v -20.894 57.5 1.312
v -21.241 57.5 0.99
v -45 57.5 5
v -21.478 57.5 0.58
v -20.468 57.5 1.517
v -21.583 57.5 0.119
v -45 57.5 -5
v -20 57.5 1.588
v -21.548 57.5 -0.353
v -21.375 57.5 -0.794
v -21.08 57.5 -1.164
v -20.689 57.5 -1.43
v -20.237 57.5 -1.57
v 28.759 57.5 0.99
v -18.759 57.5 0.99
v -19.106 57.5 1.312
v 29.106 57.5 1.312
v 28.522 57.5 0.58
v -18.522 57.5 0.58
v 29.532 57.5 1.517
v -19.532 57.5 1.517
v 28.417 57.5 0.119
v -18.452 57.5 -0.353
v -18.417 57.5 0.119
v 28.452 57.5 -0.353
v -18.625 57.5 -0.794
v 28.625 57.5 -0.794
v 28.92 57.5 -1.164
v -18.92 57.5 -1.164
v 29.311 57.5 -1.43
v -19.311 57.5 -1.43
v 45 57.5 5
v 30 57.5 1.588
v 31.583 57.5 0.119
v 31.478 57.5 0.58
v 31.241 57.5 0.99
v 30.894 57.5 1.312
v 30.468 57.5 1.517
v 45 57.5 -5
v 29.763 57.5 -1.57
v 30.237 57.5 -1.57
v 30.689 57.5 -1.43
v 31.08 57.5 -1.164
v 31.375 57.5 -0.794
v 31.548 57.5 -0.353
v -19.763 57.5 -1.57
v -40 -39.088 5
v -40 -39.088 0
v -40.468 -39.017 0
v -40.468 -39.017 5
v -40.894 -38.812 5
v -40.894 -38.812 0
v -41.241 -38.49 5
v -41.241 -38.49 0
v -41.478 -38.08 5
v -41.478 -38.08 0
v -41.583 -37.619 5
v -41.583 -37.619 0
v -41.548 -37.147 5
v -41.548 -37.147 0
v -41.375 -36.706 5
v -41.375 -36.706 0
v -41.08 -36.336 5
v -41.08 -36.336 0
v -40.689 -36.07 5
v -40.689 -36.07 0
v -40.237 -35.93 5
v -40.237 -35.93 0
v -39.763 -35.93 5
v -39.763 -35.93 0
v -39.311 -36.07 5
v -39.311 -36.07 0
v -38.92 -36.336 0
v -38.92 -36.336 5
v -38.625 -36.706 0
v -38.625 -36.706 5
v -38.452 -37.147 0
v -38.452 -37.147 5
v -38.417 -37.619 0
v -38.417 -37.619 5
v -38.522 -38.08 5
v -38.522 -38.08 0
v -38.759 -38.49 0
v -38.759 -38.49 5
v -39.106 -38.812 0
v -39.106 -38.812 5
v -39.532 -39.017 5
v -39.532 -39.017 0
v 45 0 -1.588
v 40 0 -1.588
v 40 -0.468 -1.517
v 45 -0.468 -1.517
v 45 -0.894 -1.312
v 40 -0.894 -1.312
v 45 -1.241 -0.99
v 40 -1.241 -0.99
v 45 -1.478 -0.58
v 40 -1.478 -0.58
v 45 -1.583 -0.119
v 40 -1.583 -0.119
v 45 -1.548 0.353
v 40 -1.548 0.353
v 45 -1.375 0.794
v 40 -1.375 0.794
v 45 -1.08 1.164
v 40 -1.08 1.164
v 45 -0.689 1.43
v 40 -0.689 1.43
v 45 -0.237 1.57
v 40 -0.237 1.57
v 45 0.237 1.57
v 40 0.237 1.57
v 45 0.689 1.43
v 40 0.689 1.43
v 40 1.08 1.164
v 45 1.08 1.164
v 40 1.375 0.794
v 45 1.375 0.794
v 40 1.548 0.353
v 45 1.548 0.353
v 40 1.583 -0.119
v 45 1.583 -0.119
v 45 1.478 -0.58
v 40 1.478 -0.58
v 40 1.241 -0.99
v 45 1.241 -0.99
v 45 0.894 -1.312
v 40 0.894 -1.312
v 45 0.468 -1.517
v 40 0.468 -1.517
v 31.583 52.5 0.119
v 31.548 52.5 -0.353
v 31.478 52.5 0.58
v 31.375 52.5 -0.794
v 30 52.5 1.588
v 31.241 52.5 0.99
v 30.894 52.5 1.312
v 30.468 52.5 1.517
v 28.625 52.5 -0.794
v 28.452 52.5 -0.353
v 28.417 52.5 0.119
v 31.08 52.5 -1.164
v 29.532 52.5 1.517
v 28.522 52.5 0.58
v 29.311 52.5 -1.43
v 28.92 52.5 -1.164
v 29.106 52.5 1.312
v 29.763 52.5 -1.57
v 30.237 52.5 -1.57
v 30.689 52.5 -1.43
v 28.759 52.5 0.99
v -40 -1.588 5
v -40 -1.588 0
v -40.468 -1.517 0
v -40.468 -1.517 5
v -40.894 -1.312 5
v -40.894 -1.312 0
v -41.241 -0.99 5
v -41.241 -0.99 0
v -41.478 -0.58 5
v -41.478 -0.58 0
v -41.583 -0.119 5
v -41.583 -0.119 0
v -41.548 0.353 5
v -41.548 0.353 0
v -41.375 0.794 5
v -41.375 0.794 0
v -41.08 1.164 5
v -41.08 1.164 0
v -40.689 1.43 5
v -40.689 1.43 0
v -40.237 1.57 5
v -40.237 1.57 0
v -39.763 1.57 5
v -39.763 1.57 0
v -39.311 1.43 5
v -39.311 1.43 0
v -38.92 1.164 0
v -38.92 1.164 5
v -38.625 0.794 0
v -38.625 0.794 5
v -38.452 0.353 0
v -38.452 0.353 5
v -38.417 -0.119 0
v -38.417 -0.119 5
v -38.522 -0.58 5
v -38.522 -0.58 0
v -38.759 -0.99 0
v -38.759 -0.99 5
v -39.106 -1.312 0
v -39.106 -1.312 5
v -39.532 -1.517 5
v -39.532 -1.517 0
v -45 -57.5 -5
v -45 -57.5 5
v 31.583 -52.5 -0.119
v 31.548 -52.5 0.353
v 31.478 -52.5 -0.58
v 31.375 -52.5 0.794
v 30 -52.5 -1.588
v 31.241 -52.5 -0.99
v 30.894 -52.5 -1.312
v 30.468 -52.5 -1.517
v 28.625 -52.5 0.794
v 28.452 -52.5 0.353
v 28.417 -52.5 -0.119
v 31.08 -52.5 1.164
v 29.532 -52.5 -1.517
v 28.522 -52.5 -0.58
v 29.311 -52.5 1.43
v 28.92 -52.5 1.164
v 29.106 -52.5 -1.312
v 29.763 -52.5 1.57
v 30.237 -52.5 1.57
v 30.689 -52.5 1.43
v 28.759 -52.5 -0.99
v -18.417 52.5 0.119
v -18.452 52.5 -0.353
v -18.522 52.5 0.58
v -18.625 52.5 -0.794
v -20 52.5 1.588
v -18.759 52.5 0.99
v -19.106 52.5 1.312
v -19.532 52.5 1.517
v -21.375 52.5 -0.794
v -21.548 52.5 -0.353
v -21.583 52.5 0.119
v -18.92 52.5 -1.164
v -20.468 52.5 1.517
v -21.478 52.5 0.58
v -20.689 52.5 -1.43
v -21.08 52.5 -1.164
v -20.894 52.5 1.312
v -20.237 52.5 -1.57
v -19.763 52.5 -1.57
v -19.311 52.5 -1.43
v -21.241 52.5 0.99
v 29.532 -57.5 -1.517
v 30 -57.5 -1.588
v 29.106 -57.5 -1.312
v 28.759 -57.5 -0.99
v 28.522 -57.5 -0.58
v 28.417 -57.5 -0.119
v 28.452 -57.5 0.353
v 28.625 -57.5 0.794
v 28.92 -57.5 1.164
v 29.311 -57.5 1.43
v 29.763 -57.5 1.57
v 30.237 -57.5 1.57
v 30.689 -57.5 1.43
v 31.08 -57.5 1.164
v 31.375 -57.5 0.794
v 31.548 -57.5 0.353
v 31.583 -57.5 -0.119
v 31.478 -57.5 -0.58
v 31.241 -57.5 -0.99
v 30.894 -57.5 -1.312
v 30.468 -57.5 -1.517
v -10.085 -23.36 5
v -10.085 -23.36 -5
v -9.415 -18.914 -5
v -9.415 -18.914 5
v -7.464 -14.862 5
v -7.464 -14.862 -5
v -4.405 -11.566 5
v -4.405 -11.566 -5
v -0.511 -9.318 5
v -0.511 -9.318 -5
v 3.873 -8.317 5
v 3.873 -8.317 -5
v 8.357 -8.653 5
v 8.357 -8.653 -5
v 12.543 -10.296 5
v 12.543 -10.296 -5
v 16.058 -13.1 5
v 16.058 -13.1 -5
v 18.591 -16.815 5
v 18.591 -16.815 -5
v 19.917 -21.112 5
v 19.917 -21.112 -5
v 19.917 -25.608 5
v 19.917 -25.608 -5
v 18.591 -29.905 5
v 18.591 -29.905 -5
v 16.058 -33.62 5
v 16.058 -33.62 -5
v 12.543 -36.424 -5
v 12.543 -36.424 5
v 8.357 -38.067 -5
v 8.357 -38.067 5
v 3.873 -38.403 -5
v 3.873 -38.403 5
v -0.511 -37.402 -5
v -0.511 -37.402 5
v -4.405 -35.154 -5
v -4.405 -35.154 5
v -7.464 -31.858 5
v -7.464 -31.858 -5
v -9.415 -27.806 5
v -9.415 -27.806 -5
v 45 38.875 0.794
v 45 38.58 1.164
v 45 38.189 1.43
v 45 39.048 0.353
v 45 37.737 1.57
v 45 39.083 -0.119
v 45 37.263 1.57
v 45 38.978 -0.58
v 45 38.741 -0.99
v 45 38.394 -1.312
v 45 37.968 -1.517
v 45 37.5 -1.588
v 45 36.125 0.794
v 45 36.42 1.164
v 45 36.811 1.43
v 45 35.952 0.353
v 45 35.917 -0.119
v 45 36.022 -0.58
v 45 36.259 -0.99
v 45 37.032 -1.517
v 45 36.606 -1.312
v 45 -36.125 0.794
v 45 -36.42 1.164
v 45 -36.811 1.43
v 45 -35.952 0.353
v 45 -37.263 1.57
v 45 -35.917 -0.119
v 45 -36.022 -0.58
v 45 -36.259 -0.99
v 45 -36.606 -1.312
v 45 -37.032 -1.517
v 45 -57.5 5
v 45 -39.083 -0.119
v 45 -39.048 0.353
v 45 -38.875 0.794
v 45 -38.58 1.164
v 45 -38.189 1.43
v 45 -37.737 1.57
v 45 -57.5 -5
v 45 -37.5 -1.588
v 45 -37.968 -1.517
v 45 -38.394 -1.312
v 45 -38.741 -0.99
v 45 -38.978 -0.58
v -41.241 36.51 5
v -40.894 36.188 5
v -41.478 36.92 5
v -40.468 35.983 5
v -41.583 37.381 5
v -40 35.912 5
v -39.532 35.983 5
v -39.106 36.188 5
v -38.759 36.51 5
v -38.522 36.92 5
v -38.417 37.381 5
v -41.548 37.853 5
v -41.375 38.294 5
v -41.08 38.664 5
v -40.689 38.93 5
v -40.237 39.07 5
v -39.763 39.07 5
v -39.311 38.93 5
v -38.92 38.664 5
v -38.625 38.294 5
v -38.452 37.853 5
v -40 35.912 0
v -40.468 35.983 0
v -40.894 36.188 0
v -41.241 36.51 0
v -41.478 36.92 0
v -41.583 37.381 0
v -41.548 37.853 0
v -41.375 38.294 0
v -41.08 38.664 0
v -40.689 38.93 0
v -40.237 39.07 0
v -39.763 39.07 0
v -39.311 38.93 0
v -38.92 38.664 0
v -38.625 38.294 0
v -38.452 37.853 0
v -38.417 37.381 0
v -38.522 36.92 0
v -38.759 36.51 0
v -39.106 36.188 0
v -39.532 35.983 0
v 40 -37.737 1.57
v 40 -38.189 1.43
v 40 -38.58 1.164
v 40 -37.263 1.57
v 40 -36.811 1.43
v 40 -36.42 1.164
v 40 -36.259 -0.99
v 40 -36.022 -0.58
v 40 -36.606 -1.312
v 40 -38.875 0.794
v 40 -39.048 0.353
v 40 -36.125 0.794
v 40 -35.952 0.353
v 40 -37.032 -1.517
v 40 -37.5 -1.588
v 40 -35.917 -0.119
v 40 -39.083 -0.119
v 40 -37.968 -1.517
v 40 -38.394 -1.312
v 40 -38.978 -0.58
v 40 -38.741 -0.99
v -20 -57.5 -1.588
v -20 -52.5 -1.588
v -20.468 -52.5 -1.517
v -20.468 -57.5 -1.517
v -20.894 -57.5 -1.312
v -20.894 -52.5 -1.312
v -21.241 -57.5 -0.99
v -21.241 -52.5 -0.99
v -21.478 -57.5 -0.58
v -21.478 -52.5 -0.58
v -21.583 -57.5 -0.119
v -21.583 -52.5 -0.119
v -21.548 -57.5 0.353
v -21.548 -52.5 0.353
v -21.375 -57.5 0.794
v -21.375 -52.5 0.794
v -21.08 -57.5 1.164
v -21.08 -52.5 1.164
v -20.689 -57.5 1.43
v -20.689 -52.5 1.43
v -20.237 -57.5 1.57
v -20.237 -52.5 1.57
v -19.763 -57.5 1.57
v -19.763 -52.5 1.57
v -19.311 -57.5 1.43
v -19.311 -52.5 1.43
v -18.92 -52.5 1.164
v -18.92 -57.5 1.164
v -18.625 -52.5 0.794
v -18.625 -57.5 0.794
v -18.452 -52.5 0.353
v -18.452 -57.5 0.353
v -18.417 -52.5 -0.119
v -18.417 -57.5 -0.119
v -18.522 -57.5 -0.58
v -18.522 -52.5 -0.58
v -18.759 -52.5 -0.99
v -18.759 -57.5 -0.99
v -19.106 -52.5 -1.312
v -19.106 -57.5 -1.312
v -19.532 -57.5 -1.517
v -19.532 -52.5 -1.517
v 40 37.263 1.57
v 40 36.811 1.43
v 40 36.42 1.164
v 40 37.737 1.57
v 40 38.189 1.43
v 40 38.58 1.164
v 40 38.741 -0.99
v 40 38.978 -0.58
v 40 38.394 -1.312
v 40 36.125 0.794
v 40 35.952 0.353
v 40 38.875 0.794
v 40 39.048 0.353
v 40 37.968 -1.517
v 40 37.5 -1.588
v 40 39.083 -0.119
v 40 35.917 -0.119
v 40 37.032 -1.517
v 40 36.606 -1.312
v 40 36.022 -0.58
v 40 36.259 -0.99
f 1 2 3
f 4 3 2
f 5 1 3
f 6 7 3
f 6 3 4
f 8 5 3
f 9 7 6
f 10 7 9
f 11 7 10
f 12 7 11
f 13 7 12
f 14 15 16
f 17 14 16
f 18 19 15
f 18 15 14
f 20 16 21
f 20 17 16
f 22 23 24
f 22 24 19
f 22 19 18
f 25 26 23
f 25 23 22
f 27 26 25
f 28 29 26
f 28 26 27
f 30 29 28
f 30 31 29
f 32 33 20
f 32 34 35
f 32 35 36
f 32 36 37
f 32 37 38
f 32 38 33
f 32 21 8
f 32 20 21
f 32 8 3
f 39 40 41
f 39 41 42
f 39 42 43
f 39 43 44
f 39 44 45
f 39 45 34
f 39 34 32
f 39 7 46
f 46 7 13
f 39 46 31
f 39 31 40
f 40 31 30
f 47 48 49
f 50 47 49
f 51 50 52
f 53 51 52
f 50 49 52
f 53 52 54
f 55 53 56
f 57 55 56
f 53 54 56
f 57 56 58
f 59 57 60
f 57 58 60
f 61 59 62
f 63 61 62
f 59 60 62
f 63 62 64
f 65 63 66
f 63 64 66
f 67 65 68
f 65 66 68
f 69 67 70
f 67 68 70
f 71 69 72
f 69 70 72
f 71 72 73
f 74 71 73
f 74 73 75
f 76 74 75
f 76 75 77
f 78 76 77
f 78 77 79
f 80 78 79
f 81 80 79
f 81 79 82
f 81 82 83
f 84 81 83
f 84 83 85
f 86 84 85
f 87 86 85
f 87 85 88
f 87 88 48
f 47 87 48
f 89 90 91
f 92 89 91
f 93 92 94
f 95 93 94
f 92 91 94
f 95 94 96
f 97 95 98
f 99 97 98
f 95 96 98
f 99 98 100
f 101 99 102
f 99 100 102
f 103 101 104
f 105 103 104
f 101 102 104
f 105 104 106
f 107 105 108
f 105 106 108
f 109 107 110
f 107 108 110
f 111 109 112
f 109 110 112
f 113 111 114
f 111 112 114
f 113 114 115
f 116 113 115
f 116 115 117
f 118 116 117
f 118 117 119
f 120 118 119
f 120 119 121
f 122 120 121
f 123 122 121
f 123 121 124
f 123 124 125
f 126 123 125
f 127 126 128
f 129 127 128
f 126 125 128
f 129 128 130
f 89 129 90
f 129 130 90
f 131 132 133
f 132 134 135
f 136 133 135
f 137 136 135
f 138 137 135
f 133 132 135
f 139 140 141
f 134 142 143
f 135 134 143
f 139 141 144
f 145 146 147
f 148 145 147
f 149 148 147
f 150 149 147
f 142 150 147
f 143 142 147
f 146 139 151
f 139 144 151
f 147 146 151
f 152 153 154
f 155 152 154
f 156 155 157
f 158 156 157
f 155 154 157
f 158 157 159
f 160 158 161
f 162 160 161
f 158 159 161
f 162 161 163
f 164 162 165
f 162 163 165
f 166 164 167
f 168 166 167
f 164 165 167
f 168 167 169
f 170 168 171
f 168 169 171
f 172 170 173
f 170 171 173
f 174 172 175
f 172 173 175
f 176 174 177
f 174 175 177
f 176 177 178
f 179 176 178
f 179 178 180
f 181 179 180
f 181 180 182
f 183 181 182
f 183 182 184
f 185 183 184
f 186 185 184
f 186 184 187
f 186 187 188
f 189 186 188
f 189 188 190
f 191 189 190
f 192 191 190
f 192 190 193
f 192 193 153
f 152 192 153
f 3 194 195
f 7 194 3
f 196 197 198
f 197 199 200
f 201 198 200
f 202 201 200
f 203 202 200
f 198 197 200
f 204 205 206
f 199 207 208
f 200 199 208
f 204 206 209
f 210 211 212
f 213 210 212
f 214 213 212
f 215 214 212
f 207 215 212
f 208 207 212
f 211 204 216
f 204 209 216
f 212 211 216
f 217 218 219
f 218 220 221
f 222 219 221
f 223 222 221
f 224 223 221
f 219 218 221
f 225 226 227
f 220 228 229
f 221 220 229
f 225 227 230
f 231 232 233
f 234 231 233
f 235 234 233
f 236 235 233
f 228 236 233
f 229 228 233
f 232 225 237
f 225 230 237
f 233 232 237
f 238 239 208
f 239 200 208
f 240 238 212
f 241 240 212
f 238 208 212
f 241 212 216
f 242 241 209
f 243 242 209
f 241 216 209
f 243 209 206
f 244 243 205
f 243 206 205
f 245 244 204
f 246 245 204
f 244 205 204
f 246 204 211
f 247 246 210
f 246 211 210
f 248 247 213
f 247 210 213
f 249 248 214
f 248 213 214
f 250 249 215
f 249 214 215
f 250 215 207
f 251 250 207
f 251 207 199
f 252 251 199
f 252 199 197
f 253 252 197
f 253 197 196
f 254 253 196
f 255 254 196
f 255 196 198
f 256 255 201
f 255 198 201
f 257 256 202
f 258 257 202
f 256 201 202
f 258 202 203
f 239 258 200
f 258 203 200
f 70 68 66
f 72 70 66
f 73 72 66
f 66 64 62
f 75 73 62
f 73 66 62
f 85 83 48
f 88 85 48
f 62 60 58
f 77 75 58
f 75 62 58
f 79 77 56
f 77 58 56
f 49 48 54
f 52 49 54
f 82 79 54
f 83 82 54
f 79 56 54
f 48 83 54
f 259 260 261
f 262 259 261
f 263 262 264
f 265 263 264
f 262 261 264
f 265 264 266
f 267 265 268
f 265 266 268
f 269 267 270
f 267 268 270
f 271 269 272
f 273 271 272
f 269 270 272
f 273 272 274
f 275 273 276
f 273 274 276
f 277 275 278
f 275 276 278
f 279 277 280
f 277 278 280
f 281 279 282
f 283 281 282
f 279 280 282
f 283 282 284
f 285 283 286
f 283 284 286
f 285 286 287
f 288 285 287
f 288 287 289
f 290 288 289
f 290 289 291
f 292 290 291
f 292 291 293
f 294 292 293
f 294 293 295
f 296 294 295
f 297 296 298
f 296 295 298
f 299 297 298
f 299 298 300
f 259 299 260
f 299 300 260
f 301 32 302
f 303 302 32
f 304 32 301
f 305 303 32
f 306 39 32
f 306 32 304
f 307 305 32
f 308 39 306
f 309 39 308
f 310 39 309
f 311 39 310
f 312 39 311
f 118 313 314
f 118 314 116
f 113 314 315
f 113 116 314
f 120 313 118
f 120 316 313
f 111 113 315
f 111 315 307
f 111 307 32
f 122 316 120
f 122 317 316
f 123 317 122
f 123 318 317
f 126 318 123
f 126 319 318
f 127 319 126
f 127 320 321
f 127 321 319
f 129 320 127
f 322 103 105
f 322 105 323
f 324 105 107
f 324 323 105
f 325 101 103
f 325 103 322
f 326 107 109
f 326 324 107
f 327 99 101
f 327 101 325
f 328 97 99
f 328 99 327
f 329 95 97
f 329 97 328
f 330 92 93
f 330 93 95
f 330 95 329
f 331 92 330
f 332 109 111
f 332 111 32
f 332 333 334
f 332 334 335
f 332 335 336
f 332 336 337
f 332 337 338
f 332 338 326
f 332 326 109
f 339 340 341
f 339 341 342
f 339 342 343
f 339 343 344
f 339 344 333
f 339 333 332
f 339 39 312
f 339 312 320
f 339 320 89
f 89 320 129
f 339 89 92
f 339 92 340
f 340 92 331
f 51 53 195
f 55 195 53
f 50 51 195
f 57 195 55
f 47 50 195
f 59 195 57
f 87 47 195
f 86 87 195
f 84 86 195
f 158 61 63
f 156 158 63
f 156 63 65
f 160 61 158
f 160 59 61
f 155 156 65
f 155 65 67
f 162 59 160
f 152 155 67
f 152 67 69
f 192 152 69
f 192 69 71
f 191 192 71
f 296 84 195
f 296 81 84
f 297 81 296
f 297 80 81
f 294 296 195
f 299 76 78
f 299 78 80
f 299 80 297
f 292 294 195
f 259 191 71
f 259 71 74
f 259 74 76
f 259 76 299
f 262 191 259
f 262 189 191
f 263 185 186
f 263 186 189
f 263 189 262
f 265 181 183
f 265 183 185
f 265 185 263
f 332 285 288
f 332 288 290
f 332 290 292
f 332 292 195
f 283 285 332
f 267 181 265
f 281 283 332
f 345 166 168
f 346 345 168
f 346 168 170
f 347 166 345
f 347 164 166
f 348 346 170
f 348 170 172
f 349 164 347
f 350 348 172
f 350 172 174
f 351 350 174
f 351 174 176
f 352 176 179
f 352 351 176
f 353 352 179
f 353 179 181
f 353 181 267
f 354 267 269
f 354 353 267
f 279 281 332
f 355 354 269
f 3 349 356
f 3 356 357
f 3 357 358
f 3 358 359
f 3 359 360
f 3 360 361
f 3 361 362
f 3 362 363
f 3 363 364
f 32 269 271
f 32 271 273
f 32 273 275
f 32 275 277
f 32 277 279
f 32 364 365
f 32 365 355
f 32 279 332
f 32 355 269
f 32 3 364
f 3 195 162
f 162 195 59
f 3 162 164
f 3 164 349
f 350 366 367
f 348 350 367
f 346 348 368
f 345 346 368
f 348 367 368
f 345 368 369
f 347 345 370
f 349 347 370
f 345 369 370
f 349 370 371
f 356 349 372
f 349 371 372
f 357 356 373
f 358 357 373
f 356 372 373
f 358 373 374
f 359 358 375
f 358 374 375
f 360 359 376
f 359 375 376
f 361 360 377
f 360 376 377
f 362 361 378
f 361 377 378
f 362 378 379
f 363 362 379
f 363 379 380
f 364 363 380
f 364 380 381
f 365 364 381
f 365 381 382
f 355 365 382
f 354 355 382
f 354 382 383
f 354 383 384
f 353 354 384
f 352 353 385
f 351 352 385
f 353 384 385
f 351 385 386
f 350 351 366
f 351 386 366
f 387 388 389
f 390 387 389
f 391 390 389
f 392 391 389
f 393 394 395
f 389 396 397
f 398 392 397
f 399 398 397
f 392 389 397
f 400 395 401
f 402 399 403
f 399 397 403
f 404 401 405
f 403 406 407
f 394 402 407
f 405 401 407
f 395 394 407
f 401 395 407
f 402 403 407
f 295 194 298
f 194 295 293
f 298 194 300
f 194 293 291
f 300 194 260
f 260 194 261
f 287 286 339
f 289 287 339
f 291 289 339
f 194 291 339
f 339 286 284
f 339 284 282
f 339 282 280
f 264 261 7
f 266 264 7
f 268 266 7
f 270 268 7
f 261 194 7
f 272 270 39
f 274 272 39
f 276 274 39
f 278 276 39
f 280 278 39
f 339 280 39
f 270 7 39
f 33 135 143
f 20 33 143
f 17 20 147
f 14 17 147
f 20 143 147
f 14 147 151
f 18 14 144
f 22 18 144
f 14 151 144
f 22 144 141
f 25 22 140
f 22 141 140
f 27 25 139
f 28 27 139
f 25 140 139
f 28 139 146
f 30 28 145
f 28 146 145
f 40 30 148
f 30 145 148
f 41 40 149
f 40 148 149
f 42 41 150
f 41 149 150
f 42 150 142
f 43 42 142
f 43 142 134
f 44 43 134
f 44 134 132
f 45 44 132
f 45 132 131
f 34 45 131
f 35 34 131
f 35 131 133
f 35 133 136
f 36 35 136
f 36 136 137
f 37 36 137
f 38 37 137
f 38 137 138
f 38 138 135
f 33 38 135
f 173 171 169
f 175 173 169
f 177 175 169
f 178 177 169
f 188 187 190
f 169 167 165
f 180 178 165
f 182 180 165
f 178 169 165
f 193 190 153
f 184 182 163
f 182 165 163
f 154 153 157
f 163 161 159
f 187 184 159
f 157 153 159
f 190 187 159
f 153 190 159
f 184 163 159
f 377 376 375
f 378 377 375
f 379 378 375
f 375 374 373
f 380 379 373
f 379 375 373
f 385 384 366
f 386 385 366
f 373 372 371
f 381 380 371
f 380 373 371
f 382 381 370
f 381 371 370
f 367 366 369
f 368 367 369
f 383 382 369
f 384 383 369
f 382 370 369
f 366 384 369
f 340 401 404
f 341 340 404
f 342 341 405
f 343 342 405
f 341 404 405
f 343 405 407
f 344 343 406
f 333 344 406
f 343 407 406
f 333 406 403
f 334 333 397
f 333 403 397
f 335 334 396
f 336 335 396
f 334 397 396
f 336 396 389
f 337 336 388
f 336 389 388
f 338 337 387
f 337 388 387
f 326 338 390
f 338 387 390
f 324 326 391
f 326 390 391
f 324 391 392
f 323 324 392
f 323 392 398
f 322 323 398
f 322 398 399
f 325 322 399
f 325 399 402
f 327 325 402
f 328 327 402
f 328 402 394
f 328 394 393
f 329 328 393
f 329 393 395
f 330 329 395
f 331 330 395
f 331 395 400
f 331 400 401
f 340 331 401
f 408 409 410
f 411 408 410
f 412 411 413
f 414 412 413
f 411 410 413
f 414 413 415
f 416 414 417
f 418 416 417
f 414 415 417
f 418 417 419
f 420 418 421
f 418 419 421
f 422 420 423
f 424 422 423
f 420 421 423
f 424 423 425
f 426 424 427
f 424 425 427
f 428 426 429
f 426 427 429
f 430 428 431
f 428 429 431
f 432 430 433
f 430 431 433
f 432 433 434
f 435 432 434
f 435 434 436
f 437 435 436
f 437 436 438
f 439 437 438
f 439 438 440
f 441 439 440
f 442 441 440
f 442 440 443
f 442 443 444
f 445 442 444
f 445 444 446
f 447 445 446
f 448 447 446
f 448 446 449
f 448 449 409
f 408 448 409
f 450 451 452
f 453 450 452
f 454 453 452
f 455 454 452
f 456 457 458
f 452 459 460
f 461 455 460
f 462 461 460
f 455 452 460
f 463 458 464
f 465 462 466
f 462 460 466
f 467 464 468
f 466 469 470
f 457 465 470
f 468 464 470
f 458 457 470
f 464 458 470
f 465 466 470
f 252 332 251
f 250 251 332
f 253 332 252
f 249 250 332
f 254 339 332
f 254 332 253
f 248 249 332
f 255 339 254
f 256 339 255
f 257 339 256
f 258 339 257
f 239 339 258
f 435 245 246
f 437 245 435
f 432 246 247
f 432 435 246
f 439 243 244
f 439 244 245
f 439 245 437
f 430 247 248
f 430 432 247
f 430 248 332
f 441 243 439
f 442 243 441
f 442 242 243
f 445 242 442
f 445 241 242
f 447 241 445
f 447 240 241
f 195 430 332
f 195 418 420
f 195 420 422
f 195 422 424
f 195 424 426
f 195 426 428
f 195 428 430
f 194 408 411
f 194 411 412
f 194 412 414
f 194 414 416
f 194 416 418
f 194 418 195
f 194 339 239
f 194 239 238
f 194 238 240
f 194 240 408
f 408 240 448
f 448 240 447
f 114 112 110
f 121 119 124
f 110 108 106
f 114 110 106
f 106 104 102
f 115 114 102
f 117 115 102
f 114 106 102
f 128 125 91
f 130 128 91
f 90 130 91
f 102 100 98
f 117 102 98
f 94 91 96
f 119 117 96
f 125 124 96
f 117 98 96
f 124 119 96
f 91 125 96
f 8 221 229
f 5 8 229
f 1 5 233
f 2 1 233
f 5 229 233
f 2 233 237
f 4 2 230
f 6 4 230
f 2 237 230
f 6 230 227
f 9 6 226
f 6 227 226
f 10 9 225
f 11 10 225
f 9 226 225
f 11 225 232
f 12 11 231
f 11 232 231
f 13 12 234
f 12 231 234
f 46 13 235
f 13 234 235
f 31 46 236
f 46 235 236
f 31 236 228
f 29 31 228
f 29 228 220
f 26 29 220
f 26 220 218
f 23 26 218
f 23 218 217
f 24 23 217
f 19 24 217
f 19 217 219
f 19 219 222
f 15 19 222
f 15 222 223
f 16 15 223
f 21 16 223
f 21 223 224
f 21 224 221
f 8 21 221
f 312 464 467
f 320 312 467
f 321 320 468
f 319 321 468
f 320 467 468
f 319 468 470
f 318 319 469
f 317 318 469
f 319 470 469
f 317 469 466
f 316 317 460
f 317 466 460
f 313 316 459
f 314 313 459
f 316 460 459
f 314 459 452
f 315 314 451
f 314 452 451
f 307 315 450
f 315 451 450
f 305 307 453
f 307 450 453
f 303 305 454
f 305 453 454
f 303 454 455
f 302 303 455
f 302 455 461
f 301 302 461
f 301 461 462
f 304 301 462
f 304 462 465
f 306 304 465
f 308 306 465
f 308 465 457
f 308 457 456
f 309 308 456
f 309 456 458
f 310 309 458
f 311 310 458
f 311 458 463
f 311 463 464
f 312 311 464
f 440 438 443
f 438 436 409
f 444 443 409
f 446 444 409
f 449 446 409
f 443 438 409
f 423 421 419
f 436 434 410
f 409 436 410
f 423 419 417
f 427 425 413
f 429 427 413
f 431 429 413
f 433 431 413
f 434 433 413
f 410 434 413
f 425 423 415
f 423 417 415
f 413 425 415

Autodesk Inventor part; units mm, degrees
ref_plane "YZ Plane" through (0, 0, 0) normal (1, 0, 0) x (0, 1, 0)
ref_plane "XZ Plane" through (0, 0, 0) normal (0, 1, 0) x (-1, 0, 0)
ref_plane "XY Plane" through (0, 0, 0) normal (0, 0, 1) x (1, 0, 0)
sketch "Sketch1" plane through (0, 0, 0) normal (0, 0, 1) x (1, 0, 0)
  line L0 (-45, 57.5) -> (45, 57.5)
  line L1 (45, 57.5) -> (45, -57.5)
  line L2 (45, -57.5) -> (-45, -57.5)
  line L3 (-45, -57.5) -> (-45, 57.5)
  line L4 (-45, 57.5) -> (45, -57.5) construction
  line L5 (45, 57.5) -> (-45, -57.5) construction
  point P0 (0, 0)
  dimension "d0" = 90
  dimension "d1" = 115
extrude "Extrusion1" add sketch "Sketch1" along normal mid plane 10
sketch "Sketch2" plane through (45, -57.5, 5) normal (1, 0, 0) x (0, 0, -1)
  line L0 (10, 0) -> (0, 0) projected
  line L1 (10, 115) -> (10, 0) projected
  point P0 (5, 57.5)
  point P1 (5, 20)
  point P2 (5, 57.5)
  point P3 (5, 95)
  dimension "d4" = 20
  dimension "d5" = 5
  dimension "d8" = 37.5
hole "Hole1" at (45, -37.5, 0) at (45, 0, 0) at (45, 37.5, 0) direction (-1, 0, 0) diameter 3.175 depth 5
sketch "Sketch3" plane through (-45, -57.5, 5) normal (0, -1, 0) x (1, 0, 0)
  line L0 (0, 0) -> (0, -10) projected
  line L1 (90, -10) -> (0, -10) projected
  point P0 (45, -5)
  point P1 (25, -5)
  point P2 (75, -5)
  dimension "d20" = 25
  dimension "d21" = 5
  dimension "d24" = 50
hole "Hole2" at (-20, -57.5, 0) at (30, -57.5, 0) direction (0, 1, 0) diameter 3.175 depth 5
sketch "Sketch4" plane through (-45, 57.5, 5) normal (0, 1, 0) x (1, 0, 0)
  line L0 (0, 10) -> (0, 0) projected
  line L1 (90, 0) -> (0, 0) projected
  point P0 (45, 5)
  point P1 (25, 5)
  point P2 (75, 5)
  dimension "d36" = 25
  dimension "d37" = 5
  dimension "d40" = 50
hole "Hole3" at (-20, 57.5, 0) at (30, 57.5, 0) direction (0, -1, 0) diameter 3.175 depth 5
sketch "Sketch5" plane through (0, 0, 5) normal (0, 0, 1) x (1, 0, 0)
  line L0 (-45, 57.5) -> (-45, -57.5) projected
  line L1 (-45, -57.5) -> (45, -57.5) projected
  point P0 (0, 0)
  point P1 (-40, -37.5)
  point P2 (-40, 0)
  point P3 (-40, 37.5)
  dimension "d52" = 5
  dimension "d53" = 20
  dimension "d56" = 37.5
hole "Hole4" at (-40, -37.5, 5) at (-40, 0, 5) at (-40, 37.5, 5) direction (0, 0, -1) diameter 3.175 depth 5
sketch "Sketch7" plane through (0, 0, -5) normal (0, 0, -1) x (-1, 0, 0)
  circle A0 centre (-5, -23.36) radius 15.085
  line L0 (-45, -57.5) -> (45, -57.5) projected
  line L1 (-45, 57.5) -> (-45, -57.5) projected
  point P0 (0, 0)
  dimension "d74" = 34.14
  dimension "d75" = 40
  dimension "d76" = 30.17
extrude "Extrusion3" cut sketch "Sketch7" against normal through all
thread "Thread1" size "3/4" designation "3/4 - 14 NPT" standard "NPT" length 20.15
properties part number "left"
